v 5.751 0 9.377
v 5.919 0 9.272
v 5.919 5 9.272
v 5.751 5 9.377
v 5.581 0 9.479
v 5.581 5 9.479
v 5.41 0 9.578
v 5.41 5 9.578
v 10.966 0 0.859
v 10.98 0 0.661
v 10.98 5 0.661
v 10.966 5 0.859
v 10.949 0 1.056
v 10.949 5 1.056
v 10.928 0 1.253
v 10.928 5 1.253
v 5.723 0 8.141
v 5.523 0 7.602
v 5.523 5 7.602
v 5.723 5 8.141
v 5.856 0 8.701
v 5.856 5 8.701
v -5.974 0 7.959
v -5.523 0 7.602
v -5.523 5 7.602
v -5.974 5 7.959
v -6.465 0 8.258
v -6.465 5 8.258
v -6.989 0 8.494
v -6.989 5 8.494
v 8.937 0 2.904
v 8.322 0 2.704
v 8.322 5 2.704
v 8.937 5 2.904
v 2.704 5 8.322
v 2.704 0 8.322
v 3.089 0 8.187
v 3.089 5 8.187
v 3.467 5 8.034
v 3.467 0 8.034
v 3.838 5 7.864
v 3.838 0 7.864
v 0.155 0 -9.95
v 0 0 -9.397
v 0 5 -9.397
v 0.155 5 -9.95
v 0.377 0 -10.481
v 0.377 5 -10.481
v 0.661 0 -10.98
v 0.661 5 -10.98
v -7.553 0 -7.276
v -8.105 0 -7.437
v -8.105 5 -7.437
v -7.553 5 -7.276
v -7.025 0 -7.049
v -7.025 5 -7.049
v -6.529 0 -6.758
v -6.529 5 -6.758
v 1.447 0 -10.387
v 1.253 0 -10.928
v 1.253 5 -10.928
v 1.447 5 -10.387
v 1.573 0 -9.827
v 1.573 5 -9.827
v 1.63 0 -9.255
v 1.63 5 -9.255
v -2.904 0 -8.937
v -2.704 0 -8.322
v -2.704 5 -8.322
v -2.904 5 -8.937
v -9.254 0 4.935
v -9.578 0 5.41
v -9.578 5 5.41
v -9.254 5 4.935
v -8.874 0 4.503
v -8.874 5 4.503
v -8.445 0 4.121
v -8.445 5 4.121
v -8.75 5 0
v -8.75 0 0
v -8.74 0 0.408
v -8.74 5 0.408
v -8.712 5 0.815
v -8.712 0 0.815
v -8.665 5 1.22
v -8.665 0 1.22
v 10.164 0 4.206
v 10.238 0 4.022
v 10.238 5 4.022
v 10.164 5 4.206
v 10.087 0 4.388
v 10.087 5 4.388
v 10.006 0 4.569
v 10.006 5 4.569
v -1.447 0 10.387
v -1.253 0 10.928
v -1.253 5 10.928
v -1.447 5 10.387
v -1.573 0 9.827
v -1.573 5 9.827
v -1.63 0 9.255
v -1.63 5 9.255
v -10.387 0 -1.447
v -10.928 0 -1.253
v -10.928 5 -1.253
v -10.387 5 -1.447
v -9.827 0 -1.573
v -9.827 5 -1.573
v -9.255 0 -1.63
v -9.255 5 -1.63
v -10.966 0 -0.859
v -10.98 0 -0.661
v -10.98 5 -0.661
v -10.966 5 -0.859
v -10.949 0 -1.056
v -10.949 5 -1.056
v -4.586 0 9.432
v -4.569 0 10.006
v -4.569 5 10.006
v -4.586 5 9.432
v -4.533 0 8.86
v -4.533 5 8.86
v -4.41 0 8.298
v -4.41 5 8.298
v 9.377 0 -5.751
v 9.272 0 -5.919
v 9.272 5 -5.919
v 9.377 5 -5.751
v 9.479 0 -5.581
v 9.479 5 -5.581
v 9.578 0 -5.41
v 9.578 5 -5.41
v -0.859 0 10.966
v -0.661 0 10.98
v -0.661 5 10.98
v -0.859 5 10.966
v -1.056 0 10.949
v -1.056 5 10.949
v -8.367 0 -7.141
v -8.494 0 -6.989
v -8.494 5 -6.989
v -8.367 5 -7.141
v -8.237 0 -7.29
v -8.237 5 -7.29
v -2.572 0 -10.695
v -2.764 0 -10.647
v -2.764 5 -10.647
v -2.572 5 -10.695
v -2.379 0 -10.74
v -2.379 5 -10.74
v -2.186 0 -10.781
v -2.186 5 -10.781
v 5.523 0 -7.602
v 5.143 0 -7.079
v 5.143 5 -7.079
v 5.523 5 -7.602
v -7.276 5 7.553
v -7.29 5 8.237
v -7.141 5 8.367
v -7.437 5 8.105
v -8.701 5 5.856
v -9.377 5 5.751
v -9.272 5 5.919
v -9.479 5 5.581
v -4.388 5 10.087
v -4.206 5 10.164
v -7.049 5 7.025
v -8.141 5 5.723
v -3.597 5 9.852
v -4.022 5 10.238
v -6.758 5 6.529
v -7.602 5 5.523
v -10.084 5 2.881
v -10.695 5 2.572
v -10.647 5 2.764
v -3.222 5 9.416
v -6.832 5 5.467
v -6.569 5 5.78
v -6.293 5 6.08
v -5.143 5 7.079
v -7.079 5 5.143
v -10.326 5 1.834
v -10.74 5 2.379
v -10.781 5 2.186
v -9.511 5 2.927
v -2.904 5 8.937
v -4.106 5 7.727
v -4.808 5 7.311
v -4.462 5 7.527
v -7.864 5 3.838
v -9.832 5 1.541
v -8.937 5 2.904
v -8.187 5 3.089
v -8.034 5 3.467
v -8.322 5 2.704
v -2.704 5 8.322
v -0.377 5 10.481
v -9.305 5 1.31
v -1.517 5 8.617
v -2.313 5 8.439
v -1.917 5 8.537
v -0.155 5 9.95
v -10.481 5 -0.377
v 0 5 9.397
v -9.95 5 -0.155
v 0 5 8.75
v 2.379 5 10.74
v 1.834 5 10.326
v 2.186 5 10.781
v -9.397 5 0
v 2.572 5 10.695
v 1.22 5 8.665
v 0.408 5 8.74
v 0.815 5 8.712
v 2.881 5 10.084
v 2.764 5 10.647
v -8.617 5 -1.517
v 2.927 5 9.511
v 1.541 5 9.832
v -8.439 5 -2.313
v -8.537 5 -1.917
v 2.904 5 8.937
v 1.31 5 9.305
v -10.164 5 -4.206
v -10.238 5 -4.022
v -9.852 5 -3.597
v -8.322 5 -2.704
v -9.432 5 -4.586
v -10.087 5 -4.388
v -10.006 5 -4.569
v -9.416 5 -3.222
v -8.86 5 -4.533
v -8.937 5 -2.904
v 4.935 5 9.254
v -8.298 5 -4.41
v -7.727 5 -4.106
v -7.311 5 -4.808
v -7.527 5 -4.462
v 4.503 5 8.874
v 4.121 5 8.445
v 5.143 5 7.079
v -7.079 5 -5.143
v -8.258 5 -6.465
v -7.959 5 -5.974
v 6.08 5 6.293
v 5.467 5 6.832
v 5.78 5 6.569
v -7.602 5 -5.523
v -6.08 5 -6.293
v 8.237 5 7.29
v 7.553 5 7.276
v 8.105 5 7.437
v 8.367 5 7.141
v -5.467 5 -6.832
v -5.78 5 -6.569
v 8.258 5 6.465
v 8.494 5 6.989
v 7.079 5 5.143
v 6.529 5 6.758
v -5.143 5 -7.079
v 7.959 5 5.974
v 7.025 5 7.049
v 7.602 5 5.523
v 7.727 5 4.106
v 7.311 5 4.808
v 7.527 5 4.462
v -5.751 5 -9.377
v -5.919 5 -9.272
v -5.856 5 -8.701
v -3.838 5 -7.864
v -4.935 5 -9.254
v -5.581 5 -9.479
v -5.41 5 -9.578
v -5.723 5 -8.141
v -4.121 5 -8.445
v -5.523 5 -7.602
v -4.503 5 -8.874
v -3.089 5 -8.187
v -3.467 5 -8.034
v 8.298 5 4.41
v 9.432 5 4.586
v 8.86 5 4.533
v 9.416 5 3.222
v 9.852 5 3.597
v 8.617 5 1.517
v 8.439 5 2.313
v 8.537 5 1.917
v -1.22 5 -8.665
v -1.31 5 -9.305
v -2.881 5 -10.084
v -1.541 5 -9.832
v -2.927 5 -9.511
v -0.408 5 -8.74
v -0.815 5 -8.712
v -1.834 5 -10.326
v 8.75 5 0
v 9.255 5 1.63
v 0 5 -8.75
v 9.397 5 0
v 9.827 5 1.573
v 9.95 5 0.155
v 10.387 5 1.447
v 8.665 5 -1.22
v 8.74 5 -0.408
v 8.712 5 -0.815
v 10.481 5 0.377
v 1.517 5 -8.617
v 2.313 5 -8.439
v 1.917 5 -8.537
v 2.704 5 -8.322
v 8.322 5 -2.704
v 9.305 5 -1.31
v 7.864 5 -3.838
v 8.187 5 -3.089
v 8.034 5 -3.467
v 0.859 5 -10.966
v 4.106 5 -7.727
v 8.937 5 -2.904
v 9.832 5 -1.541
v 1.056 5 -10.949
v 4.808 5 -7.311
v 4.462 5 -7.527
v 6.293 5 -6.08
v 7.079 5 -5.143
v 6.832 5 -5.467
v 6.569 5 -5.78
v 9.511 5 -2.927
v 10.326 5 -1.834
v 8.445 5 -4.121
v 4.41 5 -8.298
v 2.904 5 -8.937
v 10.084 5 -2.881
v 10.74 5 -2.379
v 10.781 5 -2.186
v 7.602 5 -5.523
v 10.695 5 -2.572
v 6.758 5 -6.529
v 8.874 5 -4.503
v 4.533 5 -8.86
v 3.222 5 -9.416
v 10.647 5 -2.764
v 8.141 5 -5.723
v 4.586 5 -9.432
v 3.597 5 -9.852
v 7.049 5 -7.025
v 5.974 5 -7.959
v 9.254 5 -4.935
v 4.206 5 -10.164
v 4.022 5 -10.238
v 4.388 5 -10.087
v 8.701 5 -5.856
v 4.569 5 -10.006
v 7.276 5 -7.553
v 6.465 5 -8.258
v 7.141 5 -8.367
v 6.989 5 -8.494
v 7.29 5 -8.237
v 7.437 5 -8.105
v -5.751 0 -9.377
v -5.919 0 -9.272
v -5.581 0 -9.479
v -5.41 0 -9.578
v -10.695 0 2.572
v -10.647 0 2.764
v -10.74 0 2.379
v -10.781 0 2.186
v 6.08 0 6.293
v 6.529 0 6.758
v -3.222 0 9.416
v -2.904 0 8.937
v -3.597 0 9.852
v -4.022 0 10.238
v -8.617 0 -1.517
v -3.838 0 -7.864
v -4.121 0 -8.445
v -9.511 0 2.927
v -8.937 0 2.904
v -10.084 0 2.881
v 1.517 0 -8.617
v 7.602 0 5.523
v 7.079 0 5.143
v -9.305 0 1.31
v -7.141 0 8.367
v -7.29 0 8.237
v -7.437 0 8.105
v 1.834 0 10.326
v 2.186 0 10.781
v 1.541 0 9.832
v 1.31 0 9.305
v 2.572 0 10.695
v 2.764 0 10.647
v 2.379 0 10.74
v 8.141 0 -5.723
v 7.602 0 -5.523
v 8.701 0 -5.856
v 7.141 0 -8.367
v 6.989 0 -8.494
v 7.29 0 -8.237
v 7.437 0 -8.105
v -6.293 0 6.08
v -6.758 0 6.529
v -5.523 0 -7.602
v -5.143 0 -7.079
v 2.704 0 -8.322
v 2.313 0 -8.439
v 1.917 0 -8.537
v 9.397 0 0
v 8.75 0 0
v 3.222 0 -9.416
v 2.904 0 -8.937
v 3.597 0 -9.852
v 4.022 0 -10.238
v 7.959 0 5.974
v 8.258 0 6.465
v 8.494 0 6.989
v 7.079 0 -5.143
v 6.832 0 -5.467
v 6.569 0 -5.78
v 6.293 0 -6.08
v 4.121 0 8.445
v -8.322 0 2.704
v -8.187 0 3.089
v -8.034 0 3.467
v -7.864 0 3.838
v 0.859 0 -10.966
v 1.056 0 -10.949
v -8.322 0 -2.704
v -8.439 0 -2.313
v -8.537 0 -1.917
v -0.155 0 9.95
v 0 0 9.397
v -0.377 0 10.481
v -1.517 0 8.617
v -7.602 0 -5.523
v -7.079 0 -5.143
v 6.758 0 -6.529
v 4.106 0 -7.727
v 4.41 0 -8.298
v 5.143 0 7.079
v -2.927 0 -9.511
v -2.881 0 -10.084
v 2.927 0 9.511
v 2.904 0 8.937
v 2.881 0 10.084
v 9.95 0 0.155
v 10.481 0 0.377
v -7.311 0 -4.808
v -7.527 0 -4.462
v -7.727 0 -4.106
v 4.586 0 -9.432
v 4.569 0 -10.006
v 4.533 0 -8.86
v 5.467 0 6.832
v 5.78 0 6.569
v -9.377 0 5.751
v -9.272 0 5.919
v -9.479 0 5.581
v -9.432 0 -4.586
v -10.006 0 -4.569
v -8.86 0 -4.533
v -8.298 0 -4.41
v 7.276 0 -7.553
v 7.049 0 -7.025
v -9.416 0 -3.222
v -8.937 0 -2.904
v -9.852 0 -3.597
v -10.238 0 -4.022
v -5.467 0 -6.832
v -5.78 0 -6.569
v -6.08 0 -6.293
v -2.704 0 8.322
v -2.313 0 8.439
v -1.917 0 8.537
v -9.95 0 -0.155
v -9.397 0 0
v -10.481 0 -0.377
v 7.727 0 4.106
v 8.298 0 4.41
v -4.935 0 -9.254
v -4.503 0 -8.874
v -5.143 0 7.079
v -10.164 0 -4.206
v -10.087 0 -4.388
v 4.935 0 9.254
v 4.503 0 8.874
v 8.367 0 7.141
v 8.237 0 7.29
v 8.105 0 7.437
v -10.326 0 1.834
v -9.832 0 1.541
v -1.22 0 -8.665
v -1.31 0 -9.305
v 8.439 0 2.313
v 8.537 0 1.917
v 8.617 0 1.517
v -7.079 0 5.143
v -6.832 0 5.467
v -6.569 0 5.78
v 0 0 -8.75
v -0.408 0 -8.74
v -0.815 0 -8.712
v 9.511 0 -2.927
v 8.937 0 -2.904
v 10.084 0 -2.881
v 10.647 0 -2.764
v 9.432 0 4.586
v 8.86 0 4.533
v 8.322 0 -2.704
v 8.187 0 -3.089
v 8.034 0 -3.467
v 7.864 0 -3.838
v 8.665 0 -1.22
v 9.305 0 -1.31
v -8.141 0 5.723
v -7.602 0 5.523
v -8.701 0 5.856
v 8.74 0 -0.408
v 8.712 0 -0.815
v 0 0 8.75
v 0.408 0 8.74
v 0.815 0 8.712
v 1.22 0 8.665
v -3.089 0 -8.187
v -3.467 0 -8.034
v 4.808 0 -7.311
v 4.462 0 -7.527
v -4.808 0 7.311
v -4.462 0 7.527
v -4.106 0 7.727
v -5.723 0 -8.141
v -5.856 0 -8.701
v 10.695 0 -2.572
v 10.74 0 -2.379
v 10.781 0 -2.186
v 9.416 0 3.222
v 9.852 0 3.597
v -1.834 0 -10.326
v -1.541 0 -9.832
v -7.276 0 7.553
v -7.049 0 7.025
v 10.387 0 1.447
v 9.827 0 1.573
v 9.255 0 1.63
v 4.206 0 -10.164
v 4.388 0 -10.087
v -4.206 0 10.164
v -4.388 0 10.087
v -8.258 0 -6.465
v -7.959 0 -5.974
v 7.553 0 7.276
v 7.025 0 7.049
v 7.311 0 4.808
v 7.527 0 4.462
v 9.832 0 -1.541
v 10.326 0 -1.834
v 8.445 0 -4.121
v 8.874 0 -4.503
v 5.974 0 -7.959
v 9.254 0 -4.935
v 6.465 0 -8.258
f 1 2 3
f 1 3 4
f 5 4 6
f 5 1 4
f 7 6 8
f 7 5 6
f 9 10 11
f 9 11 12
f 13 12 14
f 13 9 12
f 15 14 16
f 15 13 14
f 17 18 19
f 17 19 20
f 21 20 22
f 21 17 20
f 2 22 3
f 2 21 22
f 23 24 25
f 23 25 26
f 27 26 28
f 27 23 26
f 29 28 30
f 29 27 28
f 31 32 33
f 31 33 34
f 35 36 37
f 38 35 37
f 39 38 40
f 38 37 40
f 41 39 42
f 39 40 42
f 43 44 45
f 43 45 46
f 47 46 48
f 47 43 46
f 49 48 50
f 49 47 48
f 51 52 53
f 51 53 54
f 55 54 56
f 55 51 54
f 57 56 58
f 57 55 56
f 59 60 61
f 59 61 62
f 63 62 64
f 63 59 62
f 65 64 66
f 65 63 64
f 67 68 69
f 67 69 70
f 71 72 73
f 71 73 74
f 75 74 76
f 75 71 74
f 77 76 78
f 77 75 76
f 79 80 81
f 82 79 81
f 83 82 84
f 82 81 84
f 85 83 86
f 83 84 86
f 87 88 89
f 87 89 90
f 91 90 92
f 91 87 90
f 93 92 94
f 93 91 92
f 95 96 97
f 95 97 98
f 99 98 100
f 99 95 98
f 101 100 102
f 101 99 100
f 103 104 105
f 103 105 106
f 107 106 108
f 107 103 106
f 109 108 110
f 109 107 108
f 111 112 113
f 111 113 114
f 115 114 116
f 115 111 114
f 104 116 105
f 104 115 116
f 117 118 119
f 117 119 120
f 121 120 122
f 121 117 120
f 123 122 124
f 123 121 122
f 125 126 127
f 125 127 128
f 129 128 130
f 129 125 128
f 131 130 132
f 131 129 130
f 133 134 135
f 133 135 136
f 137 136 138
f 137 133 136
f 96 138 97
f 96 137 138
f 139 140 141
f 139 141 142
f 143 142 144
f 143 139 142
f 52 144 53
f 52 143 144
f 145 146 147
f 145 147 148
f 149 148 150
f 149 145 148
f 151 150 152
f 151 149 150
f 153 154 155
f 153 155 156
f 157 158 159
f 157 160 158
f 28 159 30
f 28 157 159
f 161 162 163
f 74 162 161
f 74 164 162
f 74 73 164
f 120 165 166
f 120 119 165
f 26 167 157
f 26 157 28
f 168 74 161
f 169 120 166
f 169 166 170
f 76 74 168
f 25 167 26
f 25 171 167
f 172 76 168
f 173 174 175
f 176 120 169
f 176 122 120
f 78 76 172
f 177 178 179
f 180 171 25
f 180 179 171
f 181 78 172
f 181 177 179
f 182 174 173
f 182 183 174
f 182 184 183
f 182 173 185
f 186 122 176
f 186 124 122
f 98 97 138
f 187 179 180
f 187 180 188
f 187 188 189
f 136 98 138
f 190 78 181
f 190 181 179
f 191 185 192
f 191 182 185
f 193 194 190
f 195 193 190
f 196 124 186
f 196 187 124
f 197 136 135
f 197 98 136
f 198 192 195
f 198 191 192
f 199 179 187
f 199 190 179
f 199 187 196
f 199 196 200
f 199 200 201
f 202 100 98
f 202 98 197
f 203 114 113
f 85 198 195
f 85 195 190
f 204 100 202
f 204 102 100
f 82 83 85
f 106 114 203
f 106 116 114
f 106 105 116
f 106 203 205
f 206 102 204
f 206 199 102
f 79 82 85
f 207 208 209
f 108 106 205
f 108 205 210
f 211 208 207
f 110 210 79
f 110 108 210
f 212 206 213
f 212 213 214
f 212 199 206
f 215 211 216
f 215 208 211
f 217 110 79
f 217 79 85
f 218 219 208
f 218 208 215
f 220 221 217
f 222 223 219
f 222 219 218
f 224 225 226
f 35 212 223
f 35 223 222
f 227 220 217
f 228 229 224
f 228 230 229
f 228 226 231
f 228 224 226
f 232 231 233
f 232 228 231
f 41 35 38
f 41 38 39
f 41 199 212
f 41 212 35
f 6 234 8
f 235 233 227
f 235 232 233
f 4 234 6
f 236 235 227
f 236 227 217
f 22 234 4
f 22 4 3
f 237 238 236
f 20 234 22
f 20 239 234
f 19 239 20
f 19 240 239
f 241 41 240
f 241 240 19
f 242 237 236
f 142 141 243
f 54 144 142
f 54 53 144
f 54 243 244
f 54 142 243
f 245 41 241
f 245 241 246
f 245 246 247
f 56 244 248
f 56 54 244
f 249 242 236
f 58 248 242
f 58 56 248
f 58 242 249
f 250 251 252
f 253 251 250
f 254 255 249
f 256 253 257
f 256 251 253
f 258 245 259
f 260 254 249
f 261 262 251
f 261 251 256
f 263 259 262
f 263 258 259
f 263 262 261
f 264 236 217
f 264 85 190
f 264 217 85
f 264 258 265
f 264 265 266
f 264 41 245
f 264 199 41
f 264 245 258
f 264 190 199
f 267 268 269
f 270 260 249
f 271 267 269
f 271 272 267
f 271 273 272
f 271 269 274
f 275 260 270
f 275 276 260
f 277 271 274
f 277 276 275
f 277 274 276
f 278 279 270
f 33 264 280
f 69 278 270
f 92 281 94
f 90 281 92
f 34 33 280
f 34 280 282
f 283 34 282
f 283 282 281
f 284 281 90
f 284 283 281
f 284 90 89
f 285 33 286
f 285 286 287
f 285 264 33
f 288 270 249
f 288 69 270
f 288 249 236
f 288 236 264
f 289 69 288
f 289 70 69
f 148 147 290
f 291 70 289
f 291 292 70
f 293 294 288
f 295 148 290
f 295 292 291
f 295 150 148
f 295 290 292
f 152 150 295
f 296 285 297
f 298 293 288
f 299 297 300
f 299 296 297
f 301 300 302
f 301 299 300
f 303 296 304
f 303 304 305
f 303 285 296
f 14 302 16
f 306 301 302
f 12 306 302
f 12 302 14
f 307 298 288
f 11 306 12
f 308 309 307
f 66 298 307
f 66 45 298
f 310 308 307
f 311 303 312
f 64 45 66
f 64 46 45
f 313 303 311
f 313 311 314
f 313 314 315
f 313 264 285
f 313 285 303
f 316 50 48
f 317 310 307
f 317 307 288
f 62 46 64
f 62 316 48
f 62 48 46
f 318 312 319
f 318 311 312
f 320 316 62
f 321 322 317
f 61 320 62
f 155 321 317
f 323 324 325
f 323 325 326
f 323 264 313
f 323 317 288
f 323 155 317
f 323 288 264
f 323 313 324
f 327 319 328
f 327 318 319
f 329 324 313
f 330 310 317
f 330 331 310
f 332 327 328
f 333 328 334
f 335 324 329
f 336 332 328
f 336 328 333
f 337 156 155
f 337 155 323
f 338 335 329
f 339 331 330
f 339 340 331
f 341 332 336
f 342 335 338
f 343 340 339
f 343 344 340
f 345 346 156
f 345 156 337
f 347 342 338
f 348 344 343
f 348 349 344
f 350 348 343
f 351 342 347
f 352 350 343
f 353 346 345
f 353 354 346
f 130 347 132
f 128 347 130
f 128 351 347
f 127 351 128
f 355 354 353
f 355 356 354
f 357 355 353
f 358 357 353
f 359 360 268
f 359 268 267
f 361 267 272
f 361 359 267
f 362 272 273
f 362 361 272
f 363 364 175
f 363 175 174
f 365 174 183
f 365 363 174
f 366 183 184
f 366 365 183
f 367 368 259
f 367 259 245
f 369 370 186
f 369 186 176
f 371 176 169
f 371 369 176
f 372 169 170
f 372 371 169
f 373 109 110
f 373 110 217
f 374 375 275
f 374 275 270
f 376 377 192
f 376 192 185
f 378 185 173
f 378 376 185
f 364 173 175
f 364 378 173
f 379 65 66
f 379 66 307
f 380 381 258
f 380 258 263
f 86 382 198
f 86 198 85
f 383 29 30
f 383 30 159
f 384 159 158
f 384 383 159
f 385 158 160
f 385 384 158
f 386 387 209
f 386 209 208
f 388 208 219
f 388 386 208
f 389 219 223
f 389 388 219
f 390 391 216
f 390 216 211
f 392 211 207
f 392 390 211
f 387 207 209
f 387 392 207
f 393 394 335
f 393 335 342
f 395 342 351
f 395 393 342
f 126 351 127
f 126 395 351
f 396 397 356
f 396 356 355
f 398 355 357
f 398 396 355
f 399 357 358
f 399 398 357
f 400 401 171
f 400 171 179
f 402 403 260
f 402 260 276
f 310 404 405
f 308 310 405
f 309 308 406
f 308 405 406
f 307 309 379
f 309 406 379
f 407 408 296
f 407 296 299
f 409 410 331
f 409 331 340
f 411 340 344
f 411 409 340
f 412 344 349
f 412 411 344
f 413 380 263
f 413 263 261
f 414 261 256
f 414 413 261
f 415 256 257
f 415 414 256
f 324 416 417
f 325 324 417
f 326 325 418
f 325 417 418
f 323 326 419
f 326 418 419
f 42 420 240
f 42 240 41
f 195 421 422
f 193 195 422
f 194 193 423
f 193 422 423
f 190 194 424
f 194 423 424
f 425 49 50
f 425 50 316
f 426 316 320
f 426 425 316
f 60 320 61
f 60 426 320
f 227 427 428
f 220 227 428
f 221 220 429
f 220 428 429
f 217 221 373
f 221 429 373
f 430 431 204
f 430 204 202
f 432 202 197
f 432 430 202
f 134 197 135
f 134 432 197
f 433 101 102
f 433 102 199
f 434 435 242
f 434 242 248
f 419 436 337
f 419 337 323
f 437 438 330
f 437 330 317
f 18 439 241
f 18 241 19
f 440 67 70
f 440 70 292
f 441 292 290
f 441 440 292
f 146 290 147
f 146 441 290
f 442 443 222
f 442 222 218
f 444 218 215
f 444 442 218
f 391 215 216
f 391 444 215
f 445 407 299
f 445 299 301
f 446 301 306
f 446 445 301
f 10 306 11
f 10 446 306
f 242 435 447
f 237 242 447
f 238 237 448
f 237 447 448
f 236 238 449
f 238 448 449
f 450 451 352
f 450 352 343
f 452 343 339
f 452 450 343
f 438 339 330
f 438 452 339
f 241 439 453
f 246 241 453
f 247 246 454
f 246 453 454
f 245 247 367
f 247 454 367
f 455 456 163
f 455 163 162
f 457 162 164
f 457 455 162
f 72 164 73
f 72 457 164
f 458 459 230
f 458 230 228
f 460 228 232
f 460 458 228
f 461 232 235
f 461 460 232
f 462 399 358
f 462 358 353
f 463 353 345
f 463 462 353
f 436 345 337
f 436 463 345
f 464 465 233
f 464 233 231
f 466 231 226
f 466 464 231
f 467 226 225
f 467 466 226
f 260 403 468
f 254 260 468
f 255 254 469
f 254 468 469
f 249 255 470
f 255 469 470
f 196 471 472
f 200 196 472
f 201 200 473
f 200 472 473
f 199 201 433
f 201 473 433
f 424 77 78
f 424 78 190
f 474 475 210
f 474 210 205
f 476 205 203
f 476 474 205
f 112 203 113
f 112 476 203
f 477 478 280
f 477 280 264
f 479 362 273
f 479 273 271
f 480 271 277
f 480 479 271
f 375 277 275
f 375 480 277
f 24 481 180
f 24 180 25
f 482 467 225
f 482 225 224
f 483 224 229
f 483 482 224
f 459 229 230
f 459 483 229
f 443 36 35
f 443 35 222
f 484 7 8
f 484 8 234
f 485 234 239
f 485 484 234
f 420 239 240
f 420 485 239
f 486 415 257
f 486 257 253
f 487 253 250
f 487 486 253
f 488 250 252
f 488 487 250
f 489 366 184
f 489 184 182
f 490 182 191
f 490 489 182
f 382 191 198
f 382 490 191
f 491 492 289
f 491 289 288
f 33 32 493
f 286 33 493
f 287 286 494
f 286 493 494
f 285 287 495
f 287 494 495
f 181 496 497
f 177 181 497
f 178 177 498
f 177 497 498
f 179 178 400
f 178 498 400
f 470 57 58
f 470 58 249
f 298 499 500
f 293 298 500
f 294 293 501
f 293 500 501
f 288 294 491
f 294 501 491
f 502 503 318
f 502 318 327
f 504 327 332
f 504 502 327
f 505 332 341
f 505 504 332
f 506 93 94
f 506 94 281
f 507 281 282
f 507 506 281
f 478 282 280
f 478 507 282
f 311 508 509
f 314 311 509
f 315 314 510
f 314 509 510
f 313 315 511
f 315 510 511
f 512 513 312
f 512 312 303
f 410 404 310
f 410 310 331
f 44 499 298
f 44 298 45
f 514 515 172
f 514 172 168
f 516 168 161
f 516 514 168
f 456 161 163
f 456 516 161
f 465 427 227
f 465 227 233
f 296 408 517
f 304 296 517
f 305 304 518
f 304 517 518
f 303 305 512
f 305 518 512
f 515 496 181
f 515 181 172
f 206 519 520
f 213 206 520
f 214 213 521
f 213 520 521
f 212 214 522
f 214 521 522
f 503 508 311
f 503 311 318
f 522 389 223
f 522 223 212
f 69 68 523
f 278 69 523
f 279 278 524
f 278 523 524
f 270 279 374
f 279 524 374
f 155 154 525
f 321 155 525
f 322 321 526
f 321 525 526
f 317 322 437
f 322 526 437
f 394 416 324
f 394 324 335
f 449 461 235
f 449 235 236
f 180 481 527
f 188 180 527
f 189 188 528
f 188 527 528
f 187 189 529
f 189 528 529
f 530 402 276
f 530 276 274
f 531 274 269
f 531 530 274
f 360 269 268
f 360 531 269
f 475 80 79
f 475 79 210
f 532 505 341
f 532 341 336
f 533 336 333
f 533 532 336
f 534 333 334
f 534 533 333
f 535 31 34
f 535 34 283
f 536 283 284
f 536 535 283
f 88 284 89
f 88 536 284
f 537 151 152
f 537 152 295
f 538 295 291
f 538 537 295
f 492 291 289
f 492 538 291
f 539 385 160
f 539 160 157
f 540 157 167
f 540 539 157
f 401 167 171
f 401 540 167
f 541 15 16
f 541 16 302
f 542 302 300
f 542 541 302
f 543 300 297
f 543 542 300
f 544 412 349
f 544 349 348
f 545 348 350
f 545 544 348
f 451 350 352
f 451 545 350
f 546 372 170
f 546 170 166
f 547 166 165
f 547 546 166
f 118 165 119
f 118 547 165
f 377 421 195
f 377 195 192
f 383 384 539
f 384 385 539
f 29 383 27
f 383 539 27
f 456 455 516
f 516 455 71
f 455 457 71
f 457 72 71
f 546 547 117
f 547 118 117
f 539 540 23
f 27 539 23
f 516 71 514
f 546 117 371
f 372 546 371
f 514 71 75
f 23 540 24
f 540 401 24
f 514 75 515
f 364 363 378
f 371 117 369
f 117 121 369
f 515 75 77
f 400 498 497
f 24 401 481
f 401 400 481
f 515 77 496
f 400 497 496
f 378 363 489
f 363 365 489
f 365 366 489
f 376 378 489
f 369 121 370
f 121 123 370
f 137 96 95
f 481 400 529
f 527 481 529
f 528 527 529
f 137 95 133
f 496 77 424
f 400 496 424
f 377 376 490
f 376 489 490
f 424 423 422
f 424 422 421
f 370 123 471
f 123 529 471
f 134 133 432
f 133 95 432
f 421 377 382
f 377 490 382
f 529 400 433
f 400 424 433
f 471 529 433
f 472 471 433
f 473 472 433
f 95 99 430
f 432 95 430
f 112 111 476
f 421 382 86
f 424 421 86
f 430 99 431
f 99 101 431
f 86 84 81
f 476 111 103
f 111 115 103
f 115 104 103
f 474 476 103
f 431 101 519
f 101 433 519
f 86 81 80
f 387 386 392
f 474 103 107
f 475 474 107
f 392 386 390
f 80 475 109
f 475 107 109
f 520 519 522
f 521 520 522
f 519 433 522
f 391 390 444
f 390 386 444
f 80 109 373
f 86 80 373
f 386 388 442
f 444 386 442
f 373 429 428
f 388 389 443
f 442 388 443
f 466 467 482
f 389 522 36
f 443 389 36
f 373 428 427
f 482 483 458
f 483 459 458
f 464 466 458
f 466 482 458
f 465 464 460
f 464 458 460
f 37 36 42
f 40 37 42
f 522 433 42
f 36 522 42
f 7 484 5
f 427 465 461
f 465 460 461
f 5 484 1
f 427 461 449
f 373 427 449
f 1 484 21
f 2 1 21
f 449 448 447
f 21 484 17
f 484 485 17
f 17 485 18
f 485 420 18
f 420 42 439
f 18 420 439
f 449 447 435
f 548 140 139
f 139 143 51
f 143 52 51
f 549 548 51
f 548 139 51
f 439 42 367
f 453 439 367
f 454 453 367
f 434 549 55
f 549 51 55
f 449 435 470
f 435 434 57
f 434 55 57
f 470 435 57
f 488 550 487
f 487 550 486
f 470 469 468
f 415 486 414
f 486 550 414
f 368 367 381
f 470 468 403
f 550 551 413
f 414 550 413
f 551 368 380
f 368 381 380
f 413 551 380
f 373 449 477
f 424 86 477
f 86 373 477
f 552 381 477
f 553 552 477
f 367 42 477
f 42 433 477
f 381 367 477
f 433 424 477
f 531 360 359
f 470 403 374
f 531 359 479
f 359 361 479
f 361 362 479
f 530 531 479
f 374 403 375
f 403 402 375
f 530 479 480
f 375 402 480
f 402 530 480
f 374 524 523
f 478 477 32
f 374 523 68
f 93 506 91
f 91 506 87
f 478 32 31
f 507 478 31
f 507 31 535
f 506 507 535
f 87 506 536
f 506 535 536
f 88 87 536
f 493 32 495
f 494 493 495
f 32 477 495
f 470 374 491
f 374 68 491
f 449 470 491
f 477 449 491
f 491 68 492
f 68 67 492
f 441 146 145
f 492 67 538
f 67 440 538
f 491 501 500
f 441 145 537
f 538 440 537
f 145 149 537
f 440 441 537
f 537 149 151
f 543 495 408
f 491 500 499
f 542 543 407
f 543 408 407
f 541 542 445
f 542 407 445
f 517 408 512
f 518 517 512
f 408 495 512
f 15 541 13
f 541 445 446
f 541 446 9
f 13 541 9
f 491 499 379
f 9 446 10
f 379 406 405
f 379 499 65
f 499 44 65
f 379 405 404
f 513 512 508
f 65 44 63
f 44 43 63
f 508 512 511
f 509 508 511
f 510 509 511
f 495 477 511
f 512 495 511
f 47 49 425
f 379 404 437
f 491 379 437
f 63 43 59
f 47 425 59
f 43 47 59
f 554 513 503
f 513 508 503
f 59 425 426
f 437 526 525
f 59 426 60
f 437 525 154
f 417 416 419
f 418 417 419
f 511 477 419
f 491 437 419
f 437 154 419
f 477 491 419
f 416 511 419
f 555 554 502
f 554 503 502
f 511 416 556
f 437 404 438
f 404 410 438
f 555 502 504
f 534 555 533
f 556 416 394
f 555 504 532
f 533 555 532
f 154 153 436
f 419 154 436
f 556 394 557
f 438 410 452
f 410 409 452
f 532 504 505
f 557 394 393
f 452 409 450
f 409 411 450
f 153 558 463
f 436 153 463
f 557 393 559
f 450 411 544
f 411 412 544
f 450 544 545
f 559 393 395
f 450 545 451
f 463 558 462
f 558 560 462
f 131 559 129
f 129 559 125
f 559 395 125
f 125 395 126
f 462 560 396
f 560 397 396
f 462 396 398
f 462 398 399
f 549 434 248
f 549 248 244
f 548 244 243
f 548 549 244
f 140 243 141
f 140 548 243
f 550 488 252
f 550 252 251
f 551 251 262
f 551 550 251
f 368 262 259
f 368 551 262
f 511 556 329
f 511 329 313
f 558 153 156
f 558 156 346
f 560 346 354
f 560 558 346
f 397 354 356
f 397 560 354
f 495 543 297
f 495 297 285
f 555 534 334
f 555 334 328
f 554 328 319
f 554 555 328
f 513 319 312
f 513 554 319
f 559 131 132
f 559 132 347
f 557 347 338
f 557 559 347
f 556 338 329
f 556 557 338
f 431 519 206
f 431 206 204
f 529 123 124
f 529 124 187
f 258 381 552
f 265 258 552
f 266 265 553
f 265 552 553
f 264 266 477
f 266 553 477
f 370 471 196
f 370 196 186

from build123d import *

# Parameters (mm, degrees)
BOSS_EXTRUDE1_DEPTH = 5
CIRPATTERN4_COUNT   = 20
SKETCH6_R           = 8.75
BOSS_EXTRUDE2_DEPTH = 5


with BuildPart() as part:
    # Sketch3 → Boss-Extrude1 (new body)
    with BuildSketch(Plane(origin=(0, 0, 0), x_dir=(1, 0, 0), z_dir=(0, 1, 0))):
        with BuildLine():
            Line((1.629672464, 9.254533474), (1.517478561, 8.617410215))
            ThreePointArc((1.517478561, 8.617410215), (0.761630034, 8.716789529), (0, 8.75))
            Line((0, 8.75), (0, 9.396926208))
            ThreePointArc((0, 9.396926208), (0.25763458, 10.219055101), (0.661482168, 10.980092957))
            ThreePointArc((0.661482168, 10.980092957), (0.957477757, 10.958249694), (1.252776281, 10.928428597))
            ThreePointArc((1.252776281, 10.928428597), (1.518520476, 10.108885116), (1.629672464, 9.254533474))
        make_face()
    extrude(amount=BOSS_EXTRUDE1_DEPTH)


with BuildPart() as cirpattern4_1:
    # CirPattern4: pattern copy
    add(part.part.rotate(Axis((0, 0, 0), (0, 1, 0)), 1 * 360 / CIRPATTERN4_COUNT))


with BuildPart() as cirpattern4_2:
    # CirPattern4: pattern copy
    add(part.part.rotate(Axis((0, 0, 0), (0, 1, 0)), 2 * 360 / CIRPATTERN4_COUNT))


with BuildPart() as cirpattern4_3:
    # CirPattern4: pattern copy
    add(part.part.rotate(Axis((0, 0, 0), (0, 1, 0)), 3 * 360 / CIRPATTERN4_COUNT))


with BuildPart() as cirpattern4_4:
    # CirPattern4: pattern copy
    add(part.part.rotate(Axis((0, 0, 0), (0, 1, 0)), 4 * 360 / CIRPATTERN4_COUNT))


with BuildPart() as cirpattern4_5:
    # CirPattern4: pattern copy
    add(part.part.rotate(Axis((0, 0, 0), (0, 1, 0)), 5 * 360 / CIRPATTERN4_COUNT))


with BuildPart() as cirpattern4_6:
    # CirPattern4: pattern copy
    add(part.part.rotate(Axis((0, 0, 0), (0, 1, 0)), 6 * 360 / CIRPATTERN4_COUNT))


with BuildPart() as cirpattern4_7:
    # CirPattern4: pattern copy
    add(part.part.rotate(Axis((0, 0, 0), (0, 1, 0)), 7 * 360 / CIRPATTERN4_COUNT))


with BuildPart() as cirpattern4_8:
    # CirPattern4: pattern copy
    add(part.part.rotate(Axis((0, 0, 0), (0, 1, 0)), 8 * 360 / CIRPATTERN4_COUNT))


with BuildPart() as cirpattern4_9:
    # CirPattern4: pattern copy
    add(part.part.rotate(Axis((0, 0, 0), (0, 1, 0)), 9 * 360 / CIRPATTERN4_COUNT))


with BuildPart() as cirpattern4_10:
    # CirPattern4: pattern copy
    add(part.part.rotate(Axis((0, 0, 0), (0, 1, 0)), 10 * 360 / CIRPATTERN4_COUNT))


with BuildPart() as cirpattern4_11:
    # CirPattern4: pattern copy
    add(part.part.rotate(Axis((0, 0, 0), (0, 1, 0)), 11 * 360 / CIRPATTERN4_COUNT))


with BuildPart() as cirpattern4_12:
    # CirPattern4: pattern copy
    add(part.part.rotate(Axis((0, 0, 0), (0, 1, 0)), 12 * 360 / CIRPATTERN4_COUNT))


with BuildPart() as cirpattern4_13:
    # CirPattern4: pattern copy
    add(part.part.rotate(Axis((0, 0, 0), (0, 1, 0)), 13 * 360 / CIRPATTERN4_COUNT))


with BuildPart() as cirpattern4_14:
    # CirPattern4: pattern copy
    add(part.part.rotate(Axis((0, 0, 0), (0, 1, 0)), 14 * 360 / CIRPATTERN4_COUNT))


with BuildPart() as cirpattern4_15:
    # CirPattern4: pattern copy
    add(part.part.rotate(Axis((0, 0, 0), (0, 1, 0)), 15 * 360 / CIRPATTERN4_COUNT))


with BuildPart() as cirpattern4_16:
    # CirPattern4: pattern copy
    add(part.part.rotate(Axis((0, 0, 0), (0, 1, 0)), 16 * 360 / CIRPATTERN4_COUNT))


with BuildPart() as cirpattern4_17:
    # CirPattern4: pattern copy
    add(part.part.rotate(Axis((0, 0, 0), (0, 1, 0)), 17 * 360 / CIRPATTERN4_COUNT))


with BuildPart() as cirpattern4_18:
    # CirPattern4: pattern copy
    add(part.part.rotate(Axis((0, 0, 0), (0, 1, 0)), 18 * 360 / CIRPATTERN4_COUNT))


with BuildPart() as cirpattern4_19:
    # CirPattern4: pattern copy
    add(part.part.rotate(Axis((0, 0, 0), (0, 1, 0)), 19 * 360 / CIRPATTERN4_COUNT))


with BuildPart() as part_1:
    add(part.part)

    add(cirpattern4_1.part)  # Boss-Extrude2 merges CirPattern4_1

    add(cirpattern4_2.part)  # Boss-Extrude2 merges CirPattern4_2

    add(cirpattern4_3.part)  # Boss-Extrude2 merges CirPattern4_3

    add(cirpattern4_4.part)  # Boss-Extrude2 merges CirPattern4_4

    add(cirpattern4_5.part)  # Boss-Extrude2 merges CirPattern4_5

    add(cirpattern4_6.part)  # Boss-Extrude2 merges CirPattern4_6

    add(cirpattern4_7.part)  # Boss-Extrude2 merges CirPattern4_7

    add(cirpattern4_8.part)  # Boss-Extrude2 merges CirPattern4_8

    add(cirpattern4_9.part)  # Boss-Extrude2 merges CirPattern4_9

    add(cirpattern4_10.part)  # Boss-Extrude2 merges CirPattern4_10

    add(cirpattern4_11.part)  # Boss-Extrude2 merges CirPattern4_11

    add(cirpattern4_12.part)  # Boss-Extrude2 merges CirPattern4_12

    add(cirpattern4_13.part)  # Boss-Extrude2 merges CirPattern4_13

    add(cirpattern4_14.part)  # Boss-Extrude2 merges CirPattern4_14

    add(cirpattern4_15.part)  # Boss-Extrude2 merges CirPattern4_15

    add(cirpattern4_16.part)  # Boss-Extrude2 merges CirPattern4_16

    add(cirpattern4_17.part)  # Boss-Extrude2 merges CirPattern4_17

    add(cirpattern4_18.part)  # Boss-Extrude2 merges CirPattern4_18

    add(cirpattern4_19.part)  # Boss-Extrude2 merges CirPattern4_19
    # Sketch6 → Boss-Extrude2 (add)
    with BuildSketch(Plane(origin=(0, 0, 0), x_dir=(1, 0, 0), z_dir=(0, 1, 0))):
        Circle(SKETCH6_R)
    extrude(amount=BOSS_EXTRUDE2_DEPTH)


solid = part_1.part
